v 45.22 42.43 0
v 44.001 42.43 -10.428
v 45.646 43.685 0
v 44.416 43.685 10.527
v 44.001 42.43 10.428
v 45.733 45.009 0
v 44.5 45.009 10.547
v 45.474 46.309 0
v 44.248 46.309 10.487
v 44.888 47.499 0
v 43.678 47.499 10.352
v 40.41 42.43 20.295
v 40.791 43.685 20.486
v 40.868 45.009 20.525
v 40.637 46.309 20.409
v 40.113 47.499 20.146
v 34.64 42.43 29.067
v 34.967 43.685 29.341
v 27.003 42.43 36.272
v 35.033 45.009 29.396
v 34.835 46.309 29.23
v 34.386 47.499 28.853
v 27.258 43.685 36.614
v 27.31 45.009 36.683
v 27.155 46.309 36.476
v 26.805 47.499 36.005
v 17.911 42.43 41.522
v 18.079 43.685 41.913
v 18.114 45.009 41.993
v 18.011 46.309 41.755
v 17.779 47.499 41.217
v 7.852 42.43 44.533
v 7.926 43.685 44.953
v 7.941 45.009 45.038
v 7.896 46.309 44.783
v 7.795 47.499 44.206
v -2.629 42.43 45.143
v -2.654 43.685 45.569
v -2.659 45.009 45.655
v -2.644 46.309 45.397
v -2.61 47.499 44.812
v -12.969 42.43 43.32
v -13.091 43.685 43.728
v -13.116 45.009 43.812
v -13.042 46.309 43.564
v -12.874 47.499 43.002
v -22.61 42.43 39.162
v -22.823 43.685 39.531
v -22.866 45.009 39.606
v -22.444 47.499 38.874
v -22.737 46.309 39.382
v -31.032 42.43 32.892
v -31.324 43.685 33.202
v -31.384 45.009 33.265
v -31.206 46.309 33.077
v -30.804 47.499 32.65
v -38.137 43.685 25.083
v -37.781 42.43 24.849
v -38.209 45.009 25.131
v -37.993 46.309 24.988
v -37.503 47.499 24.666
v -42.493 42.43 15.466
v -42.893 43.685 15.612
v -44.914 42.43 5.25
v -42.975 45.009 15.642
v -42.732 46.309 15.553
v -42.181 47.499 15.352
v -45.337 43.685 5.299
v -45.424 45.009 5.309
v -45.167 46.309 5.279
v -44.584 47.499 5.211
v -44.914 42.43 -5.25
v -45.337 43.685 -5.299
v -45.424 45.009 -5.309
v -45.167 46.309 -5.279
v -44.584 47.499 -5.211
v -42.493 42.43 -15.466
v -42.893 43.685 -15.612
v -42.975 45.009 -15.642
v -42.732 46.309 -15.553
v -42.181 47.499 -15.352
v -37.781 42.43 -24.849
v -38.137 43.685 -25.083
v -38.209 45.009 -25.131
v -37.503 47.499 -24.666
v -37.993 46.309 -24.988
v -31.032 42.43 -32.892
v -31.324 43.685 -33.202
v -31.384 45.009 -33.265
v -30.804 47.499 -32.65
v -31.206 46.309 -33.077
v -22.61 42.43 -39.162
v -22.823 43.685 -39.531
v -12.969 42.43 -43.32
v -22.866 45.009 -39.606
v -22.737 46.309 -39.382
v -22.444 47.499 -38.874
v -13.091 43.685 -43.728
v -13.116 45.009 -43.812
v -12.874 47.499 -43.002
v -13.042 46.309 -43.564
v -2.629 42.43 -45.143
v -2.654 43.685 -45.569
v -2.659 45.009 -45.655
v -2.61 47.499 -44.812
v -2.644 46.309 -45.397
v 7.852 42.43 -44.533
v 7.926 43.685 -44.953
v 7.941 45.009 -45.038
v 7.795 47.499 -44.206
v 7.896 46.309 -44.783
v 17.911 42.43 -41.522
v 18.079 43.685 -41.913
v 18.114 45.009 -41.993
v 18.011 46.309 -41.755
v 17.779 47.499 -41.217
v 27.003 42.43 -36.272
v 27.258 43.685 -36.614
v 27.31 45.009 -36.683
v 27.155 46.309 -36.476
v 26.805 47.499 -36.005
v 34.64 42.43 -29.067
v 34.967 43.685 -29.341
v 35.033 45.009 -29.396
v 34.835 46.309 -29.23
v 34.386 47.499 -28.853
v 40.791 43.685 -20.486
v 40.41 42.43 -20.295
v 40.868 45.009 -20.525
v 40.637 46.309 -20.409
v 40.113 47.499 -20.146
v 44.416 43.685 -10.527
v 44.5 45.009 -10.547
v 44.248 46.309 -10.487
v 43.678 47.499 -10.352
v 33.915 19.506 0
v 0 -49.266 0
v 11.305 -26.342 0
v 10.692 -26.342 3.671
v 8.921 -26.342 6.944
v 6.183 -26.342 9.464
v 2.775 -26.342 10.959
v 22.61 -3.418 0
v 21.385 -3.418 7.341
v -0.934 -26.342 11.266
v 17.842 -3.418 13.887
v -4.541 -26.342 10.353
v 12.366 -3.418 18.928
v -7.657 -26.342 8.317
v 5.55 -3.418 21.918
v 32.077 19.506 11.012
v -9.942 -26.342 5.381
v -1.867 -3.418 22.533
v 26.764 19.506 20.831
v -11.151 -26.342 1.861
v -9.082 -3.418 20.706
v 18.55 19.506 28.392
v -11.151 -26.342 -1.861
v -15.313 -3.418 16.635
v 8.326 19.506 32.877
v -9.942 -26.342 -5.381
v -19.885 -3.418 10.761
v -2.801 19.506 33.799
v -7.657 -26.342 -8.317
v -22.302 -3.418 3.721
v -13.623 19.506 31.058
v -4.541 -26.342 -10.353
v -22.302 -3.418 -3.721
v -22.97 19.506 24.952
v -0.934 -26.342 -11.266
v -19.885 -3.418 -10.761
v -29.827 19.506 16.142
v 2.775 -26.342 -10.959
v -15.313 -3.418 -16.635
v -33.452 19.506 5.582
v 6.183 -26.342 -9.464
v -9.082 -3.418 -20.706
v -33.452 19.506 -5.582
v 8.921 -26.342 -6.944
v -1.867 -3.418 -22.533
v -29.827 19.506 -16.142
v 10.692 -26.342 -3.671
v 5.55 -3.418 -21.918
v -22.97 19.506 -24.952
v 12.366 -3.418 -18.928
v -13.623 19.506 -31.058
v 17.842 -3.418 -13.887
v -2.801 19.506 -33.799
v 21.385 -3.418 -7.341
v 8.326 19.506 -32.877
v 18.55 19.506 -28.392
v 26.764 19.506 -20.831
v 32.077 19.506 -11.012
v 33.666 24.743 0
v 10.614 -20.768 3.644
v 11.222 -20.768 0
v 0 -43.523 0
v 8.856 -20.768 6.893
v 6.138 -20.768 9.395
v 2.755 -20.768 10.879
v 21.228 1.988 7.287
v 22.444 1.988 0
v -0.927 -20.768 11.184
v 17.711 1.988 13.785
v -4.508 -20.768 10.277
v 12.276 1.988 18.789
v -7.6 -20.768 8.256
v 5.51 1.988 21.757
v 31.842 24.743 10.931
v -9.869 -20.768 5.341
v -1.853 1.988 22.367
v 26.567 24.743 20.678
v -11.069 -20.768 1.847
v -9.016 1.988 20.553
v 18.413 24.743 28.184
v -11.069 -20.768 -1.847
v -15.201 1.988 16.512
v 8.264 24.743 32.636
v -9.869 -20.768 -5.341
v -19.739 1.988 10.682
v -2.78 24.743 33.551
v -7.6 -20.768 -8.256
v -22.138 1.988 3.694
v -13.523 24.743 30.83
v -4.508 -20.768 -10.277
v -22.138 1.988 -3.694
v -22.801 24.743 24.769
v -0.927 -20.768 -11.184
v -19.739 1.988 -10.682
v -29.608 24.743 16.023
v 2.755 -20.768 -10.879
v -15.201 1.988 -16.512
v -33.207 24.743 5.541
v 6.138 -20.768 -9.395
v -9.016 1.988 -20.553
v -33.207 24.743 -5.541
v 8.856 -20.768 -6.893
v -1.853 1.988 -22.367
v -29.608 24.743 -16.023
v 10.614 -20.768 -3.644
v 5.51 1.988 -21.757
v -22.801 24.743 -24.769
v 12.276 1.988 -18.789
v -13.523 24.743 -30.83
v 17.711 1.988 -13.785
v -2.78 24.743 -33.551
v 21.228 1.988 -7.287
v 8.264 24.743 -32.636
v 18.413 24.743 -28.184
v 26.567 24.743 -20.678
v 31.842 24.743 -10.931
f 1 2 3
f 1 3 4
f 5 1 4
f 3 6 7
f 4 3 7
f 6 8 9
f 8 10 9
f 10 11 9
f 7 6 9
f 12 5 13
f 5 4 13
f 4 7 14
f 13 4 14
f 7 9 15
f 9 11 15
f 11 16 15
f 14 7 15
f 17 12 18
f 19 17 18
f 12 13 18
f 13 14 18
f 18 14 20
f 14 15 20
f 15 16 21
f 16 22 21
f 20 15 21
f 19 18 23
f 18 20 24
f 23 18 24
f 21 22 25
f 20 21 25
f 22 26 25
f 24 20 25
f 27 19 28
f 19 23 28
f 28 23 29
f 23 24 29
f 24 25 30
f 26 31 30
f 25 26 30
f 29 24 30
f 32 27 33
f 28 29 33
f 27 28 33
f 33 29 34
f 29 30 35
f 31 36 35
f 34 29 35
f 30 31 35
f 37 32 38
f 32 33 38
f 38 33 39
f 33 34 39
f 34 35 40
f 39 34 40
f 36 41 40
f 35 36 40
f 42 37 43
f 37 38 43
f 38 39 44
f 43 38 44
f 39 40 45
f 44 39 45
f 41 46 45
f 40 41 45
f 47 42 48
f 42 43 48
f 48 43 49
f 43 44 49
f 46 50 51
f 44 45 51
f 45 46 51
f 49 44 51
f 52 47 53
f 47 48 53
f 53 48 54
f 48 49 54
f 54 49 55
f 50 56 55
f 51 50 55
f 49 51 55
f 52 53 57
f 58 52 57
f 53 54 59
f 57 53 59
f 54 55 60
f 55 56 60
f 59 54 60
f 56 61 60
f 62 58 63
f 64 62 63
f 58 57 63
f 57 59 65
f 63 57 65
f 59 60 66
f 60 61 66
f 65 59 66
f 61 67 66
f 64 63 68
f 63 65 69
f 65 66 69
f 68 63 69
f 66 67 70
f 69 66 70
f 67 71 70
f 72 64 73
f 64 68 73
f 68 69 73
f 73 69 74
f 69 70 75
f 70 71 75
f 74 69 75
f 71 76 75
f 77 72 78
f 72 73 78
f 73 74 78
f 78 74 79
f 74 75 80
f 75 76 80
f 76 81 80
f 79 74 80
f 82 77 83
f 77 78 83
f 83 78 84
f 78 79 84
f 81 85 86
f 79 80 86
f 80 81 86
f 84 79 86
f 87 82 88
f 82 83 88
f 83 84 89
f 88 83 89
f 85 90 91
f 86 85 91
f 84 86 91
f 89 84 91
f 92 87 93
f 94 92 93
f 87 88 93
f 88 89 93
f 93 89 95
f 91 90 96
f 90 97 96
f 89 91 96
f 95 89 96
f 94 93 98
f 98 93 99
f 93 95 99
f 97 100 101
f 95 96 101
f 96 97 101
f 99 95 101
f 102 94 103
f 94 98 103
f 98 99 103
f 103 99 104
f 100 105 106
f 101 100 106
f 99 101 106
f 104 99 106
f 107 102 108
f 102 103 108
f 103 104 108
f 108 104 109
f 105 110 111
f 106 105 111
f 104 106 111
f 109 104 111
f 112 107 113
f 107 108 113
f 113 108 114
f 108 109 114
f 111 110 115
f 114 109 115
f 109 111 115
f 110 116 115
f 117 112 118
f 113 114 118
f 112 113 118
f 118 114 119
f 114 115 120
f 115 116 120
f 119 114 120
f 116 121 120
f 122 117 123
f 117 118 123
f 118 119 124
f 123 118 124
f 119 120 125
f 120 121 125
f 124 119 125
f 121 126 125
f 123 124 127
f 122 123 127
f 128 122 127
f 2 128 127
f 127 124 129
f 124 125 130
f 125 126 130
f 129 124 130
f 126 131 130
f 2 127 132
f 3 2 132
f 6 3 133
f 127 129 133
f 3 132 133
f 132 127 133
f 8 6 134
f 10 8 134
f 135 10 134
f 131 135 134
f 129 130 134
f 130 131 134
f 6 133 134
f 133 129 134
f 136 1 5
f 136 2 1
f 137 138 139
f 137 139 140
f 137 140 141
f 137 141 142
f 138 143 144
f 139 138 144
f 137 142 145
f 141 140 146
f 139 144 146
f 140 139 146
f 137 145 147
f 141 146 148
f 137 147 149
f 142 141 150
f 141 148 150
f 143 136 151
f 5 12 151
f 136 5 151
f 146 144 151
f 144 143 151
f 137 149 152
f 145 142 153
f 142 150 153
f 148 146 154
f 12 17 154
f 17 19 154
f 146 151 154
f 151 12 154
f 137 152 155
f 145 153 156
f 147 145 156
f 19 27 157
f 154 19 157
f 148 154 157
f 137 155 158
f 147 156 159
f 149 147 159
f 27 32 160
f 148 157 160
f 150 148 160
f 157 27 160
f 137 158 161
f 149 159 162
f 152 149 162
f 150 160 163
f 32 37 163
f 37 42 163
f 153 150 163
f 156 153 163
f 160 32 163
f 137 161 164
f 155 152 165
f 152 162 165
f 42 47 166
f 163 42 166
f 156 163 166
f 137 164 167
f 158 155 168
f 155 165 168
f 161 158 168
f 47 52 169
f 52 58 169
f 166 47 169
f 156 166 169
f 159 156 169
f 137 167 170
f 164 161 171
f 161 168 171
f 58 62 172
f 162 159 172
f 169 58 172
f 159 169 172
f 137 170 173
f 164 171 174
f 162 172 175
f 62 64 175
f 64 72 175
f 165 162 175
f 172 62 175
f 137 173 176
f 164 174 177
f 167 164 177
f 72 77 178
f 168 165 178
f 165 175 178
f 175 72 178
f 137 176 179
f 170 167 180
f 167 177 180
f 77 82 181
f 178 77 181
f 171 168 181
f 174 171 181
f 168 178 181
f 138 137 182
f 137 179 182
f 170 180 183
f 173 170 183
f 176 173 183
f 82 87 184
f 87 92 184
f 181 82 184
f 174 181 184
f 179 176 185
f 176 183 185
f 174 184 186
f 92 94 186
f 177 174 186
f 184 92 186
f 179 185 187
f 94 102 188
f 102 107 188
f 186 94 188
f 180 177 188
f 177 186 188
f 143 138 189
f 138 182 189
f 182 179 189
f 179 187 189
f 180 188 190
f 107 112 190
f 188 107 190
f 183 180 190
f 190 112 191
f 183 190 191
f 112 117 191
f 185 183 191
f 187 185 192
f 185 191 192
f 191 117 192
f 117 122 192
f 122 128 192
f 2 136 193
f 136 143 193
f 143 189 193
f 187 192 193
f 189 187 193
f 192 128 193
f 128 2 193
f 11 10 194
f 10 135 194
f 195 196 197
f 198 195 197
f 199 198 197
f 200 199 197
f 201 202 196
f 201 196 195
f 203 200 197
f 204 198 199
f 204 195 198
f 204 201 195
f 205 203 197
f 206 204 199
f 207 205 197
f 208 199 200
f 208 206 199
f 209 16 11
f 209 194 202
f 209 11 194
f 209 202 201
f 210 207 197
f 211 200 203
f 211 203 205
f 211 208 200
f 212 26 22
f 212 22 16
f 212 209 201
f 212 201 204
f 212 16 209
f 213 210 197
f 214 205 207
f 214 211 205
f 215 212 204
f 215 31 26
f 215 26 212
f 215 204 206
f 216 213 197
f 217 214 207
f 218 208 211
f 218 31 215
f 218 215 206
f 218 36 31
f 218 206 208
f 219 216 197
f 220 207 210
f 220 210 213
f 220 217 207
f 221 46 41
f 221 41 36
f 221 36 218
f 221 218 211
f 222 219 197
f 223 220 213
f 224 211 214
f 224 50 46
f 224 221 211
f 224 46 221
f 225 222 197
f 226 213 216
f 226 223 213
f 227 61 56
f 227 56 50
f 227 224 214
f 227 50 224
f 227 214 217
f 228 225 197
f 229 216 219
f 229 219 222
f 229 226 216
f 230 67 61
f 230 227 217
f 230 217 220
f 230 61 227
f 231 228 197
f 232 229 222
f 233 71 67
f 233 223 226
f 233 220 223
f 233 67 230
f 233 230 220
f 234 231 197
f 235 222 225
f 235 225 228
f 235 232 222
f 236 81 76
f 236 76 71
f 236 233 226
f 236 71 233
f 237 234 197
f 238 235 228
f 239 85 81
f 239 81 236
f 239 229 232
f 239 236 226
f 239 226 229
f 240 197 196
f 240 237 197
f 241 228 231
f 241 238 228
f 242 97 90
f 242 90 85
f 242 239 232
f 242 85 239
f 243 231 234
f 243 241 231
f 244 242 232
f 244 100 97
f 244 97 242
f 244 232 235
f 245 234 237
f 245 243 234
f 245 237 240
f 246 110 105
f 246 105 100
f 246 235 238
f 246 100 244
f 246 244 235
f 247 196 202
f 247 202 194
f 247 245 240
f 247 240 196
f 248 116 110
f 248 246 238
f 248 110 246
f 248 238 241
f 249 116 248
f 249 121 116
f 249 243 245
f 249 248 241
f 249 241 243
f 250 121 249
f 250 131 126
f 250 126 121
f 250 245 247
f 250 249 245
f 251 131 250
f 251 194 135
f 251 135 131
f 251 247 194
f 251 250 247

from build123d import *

# Parameters (mm, degrees)
F2_T = -2.54


# Not quite as in the source:
# - a fillet or chamfer that OpenCascade refuses, or shapes differently, is made with other operations: its cross-section is extruded or revolved along the edge and cut away or added


with BuildPart() as f1:
    # F0 (on Top) → F1 (revolve)
    with BuildSketch(Plane.XY):
        Polygon((0, 47.4987216294), (0, 44.8476299644), (0, -49.2661260068), (47.7196536958, 47.4987216294), align=None)
    revolve(axis=Axis((0, -2.2092480212, 0), (0, -1, 0)))

    # F2
    f2_openings = [f1.faces().sort_by_distance(p)[0] for p in [
        (0, 47.498722, 0),
    ]]
    offset(amount=F2_T, openings=f2_openings)

    # F3: fillet of radius 5.08 on 1 edges, made by hand

    # F3_s1 → F3_t2 (revolve, cut)
    with BuildSketch(Plane.XY):
        with BuildLine():
            ThreePointArc((45.2198112097, 42.4295968862), (45.7328319828, 45.0086691469), (44.8875848746, 47.4987216294))
            Line((44.8875848746, 47.4987216294), (47.7196536958, 47.4987216294))
            Line((47.7196536958, 47.4987216294), (45.2198112097, 42.4295968862))
        make_face()
    revolve(axis=Axis((0, 47.4987216294, 0), (0, -1, 0)), mode=Mode.SUBTRACT)


solid = f1.part
